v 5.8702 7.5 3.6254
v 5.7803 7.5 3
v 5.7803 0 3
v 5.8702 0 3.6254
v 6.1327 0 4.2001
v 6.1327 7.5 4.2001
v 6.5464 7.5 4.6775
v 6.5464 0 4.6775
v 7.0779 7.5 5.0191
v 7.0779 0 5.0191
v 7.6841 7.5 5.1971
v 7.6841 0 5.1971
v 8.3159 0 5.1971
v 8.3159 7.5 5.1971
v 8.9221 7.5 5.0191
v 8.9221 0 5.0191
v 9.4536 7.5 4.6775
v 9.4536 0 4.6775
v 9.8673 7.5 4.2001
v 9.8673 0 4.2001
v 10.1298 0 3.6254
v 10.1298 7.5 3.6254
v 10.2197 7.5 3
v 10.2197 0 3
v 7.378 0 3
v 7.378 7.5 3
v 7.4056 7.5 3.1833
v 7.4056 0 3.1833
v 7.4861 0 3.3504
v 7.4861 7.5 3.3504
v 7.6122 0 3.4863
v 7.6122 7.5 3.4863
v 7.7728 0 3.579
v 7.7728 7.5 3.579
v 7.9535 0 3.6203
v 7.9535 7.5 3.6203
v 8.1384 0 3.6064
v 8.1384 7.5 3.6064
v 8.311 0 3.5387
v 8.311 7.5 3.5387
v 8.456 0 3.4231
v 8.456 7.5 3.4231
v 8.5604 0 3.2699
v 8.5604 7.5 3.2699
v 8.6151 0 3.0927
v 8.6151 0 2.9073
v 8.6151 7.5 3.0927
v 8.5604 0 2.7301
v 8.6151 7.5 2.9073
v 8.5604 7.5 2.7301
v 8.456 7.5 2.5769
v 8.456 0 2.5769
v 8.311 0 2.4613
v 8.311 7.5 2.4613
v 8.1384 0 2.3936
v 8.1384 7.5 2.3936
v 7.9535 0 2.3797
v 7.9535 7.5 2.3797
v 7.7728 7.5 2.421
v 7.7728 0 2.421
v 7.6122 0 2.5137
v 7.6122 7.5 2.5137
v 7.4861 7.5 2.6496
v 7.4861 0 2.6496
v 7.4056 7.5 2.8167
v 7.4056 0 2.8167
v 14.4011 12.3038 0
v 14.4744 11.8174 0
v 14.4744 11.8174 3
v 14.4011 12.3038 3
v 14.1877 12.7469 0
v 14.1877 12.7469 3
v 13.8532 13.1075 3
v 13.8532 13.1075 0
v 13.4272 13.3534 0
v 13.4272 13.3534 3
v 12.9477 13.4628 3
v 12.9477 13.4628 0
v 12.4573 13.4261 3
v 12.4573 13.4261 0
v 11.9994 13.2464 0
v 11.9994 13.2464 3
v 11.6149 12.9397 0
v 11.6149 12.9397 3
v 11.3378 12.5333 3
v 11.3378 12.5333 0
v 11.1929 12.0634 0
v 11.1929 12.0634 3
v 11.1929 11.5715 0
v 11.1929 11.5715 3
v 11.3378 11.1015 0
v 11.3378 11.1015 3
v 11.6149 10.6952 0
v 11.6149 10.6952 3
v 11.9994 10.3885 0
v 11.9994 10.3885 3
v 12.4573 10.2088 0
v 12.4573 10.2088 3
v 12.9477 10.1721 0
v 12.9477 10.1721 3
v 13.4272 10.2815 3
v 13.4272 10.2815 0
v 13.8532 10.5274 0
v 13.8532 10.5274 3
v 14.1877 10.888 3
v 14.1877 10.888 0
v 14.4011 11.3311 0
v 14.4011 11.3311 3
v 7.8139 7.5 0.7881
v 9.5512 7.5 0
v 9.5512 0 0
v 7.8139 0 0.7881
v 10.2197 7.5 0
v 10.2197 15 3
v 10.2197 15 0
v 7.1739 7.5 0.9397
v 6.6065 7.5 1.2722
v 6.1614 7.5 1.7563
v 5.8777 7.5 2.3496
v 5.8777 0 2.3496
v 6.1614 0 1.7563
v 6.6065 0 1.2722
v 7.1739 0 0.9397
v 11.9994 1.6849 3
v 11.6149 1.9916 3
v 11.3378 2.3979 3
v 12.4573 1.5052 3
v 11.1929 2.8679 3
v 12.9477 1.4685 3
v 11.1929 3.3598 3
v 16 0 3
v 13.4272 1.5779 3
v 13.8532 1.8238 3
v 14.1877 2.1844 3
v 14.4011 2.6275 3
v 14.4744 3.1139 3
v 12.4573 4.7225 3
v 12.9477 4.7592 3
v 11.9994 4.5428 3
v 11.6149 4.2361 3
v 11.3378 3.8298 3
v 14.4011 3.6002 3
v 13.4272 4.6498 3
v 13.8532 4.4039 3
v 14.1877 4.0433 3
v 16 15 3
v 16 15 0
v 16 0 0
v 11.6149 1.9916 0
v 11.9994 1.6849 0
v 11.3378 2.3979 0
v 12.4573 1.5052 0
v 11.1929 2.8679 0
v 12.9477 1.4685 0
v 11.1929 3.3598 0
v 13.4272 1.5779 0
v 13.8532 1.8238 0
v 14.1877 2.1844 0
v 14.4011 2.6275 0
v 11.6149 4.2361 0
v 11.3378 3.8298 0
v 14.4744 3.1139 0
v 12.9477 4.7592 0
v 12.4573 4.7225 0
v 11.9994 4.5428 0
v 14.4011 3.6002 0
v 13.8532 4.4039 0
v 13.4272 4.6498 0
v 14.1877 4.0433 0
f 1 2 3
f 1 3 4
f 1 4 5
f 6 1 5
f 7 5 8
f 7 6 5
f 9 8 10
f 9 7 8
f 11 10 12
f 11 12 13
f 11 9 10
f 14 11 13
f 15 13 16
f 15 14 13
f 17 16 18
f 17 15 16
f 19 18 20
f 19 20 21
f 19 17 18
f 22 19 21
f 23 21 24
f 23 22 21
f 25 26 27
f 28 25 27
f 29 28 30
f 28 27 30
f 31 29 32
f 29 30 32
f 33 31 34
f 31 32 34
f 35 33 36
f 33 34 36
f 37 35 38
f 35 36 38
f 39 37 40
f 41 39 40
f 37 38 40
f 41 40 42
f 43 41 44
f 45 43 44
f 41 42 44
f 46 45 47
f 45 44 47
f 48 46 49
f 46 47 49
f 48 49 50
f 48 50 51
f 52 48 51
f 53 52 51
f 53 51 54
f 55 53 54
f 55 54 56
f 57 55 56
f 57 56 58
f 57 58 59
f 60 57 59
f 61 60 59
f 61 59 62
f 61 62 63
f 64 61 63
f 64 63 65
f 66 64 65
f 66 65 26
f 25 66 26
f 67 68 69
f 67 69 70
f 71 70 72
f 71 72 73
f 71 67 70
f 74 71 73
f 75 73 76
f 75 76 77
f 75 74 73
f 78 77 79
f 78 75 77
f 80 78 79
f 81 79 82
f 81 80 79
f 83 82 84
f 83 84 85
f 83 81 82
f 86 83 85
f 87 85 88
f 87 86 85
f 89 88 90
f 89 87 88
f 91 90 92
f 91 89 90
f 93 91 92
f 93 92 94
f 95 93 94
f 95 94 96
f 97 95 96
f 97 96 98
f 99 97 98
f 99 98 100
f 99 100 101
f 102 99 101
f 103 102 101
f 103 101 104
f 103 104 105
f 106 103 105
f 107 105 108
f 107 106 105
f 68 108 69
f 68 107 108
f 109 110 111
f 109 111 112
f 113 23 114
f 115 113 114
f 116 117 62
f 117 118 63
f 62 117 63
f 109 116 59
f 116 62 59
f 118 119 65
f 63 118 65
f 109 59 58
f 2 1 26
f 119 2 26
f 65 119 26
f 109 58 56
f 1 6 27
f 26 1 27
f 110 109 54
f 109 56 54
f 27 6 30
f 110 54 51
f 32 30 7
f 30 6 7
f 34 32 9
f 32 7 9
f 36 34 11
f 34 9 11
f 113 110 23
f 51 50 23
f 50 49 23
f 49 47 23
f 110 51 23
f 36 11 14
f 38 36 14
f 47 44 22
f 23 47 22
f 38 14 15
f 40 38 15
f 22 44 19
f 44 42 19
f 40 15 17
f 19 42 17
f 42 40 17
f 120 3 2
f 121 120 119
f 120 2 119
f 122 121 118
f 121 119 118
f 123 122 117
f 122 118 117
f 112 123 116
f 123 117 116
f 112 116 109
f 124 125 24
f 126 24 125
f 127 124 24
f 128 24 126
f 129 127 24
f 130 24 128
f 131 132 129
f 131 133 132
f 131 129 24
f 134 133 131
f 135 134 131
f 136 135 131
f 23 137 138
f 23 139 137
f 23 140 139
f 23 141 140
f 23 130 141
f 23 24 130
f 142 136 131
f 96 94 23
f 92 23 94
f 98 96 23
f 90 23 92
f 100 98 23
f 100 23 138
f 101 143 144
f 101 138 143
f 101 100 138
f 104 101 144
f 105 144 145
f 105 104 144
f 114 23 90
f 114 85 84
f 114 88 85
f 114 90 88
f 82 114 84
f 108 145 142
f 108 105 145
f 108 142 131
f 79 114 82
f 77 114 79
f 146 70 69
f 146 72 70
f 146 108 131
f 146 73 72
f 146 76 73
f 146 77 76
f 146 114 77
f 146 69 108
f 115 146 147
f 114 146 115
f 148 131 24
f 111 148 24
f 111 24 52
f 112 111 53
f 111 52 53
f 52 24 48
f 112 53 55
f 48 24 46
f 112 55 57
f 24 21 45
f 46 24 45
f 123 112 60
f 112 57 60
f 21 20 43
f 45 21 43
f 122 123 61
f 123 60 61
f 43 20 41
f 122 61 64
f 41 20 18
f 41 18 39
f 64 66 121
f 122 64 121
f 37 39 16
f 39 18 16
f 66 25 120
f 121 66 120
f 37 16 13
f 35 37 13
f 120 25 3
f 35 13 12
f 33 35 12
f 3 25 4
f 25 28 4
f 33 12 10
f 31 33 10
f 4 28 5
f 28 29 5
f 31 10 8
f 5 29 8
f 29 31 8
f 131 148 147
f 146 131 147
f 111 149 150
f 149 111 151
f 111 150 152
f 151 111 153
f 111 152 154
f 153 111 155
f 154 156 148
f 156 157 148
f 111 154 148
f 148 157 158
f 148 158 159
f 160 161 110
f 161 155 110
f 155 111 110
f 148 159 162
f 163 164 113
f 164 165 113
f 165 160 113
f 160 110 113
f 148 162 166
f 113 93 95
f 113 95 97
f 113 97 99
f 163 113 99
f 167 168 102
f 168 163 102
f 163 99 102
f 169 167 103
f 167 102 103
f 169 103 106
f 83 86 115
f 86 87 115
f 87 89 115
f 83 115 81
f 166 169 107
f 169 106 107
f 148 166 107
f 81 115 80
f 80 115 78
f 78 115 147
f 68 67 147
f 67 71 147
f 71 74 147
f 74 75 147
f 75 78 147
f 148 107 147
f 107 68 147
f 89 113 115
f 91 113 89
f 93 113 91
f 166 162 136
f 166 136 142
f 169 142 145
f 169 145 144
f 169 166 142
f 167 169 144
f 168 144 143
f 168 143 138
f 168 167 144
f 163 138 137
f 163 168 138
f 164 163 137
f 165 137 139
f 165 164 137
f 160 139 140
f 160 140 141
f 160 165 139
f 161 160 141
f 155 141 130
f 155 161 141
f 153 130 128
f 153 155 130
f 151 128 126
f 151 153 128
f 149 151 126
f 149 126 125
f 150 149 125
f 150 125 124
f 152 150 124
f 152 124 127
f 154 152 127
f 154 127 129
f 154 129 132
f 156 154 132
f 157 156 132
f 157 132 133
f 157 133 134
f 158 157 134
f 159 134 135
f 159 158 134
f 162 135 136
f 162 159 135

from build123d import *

# Parameters (mm, degrees)
F0_W           = 16
F0_H           = 15
F0_R           = 1.65
F1_DEPTH       = 3
F2_R           = 2.2197148543
F3_DEPTH       = 15
F4_R           = 0.622015
F5_DEPTH       = 25
F7_DEPTH       = 25
F9_DEPTH       = 15
F10_W          = 7.79368474
F10_H          = 8.6547567695
F11_DEPTH      = 25
F11_DEPTH_BACK = 25


with BuildPart() as f1:
    # F0 (on Top) → F1 (new body)
    with BuildSketch(Plane.XY):
        with Locations((8, 7.5)):
            Rectangle(F0_W, F0_H)
        with Locations((3.0942130834, 3.1138566653)):
            Circle(F0_R, mode=Mode.SUBTRACT)
        with Locations((12.8244230834, 3.1138566653)):
            Circle(F0_R, mode=Mode.SUBTRACT)
        with Locations((3.0942130834, 11.8174366653)):
            Circle(F0_R, mode=Mode.SUBTRACT)
        with Locations((12.8244230834, 11.8174366653)):
            Circle(F0_R, mode=Mode.SUBTRACT)
    extrude(amount=F1_DEPTH)

    # F2 (on face) → F3 (join, through all)
    with BuildSketch(Plane(origin=(0, 15, 0), x_dir=(-1, 0, 0), z_dir=(0, 1, 0))):
        with Locations((-8, 3)):
            Circle(F2_R)
    extrude(amount=-F3_DEPTH)

    # F4 (on face) → F5 (cut)
    with BuildSketch(Plane(origin=(0, 15, 0), x_dir=(-1, 0, 0), z_dir=(0, 1, 0))):
        with Locations((-8, 3)):
            Circle(F4_R)
        Polygon((-8, 0.8955585654), (-9.5511529364, 0), (-6.4488470636, 0), align=None)
    extrude(amount=-F5_DEPTH, mode=Mode.SUBTRACT)

    # F6 (on face) → F7 (cut)
    with BuildSketch(Plane(origin=(0, 15, 0), x_dir=(-1, 0, 0), z_dir=(0, 1, 0))):
        with BuildLine():
            ThreePointArc((-5.7802851457, 3), (-6.4976685136, 1.3659454907), (-8.1861204126, 0.7881018951))
            Line((-8.1861204126, 0.7881018951), (-9.5511529364, 0))
            Line((-9.5511529364, 0), (0, -1.0680041742))
            Line((0, -1.0680041742), (0, 3))
            Line((0, 3), (-5.7802851457, 3))
        make_face()
    extrude(amount=-F7_DEPTH, mode=Mode.SUBTRACT)

    # F8 (on face) → F9 (join, through all)
    with BuildSketch(Plane(origin=(0, 15, 0), x_dir=(-1, 0, 0), z_dir=(0, 1, 0))):
        Polygon((-8, 0.8955585654), (-9.5511529364, 0), (-7.8138795874, 0.7881018951), align=None)
    extrude(amount=-F9_DEPTH)

    # F10 (on face) → F11 (cut, two sides)
    with BuildSketch(Plane.XY.offset(3)) as f11_sk:
        with Locations((6.3228724843, 11.8273783848)):
            Rectangle(F10_W, F10_H)
    extrude(amount=-F11_DEPTH, mode=Mode.SUBTRACT)
    extrude(f11_sk.sketch, amount=F11_DEPTH_BACK, mode=Mode.SUBTRACT)


solid = f1.part
